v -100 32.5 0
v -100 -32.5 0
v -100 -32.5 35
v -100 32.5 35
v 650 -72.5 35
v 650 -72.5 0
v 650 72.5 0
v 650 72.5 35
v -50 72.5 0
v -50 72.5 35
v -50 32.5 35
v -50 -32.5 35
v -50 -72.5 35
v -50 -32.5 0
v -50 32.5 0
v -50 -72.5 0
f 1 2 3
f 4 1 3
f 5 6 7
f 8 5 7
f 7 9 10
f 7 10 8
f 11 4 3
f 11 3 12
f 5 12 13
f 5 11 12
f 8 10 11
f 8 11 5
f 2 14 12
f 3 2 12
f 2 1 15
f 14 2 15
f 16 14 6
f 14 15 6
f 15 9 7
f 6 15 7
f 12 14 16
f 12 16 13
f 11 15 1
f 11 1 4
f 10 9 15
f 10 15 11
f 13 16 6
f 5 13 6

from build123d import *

# Parameters (mm, degrees)
CROQUIS1_W              = 1300
CROQUIS1_H              = 145
SALIENTE_EXTRUIR1_DEPTH = 35
CROQUIS2_W              = 35
CROQUIS2_H              = 145
CORTAR_EXTRUIR1_DEPTH   = 600
CROQUIS3_W              = 35
CROQUIS3_H              = 65
SALIENTE_EXTRUIR2_DEPTH = 50


with BuildPart() as part:
    # Croquis1 → Saliente-Extruir1 (new body)
    with BuildSketch(Plane.XY):
        Rectangle(CROQUIS1_W, CROQUIS1_H)
    extrude(amount=SALIENTE_EXTRUIR1_DEPTH)

    # Croquis2 → Cortar-Extruir1 (cut)
    with BuildSketch(Plane.ZY.offset(650)):
        with Locations((17.5, 0)):
            Rectangle(CROQUIS2_W, CROQUIS2_H)
    extrude(amount=-CORTAR_EXTRUIR1_DEPTH, mode=Mode.SUBTRACT)

    # Croquis3 → Saliente-Extruir2 (add)
    with BuildSketch(Plane.ZY.offset(50)):
        with Locations((17.5, 0)):
            Rectangle(CROQUIS3_W, CROQUIS3_H)
    extrude(amount=SALIENTE_EXTRUIR2_DEPTH)


solid = part.part
